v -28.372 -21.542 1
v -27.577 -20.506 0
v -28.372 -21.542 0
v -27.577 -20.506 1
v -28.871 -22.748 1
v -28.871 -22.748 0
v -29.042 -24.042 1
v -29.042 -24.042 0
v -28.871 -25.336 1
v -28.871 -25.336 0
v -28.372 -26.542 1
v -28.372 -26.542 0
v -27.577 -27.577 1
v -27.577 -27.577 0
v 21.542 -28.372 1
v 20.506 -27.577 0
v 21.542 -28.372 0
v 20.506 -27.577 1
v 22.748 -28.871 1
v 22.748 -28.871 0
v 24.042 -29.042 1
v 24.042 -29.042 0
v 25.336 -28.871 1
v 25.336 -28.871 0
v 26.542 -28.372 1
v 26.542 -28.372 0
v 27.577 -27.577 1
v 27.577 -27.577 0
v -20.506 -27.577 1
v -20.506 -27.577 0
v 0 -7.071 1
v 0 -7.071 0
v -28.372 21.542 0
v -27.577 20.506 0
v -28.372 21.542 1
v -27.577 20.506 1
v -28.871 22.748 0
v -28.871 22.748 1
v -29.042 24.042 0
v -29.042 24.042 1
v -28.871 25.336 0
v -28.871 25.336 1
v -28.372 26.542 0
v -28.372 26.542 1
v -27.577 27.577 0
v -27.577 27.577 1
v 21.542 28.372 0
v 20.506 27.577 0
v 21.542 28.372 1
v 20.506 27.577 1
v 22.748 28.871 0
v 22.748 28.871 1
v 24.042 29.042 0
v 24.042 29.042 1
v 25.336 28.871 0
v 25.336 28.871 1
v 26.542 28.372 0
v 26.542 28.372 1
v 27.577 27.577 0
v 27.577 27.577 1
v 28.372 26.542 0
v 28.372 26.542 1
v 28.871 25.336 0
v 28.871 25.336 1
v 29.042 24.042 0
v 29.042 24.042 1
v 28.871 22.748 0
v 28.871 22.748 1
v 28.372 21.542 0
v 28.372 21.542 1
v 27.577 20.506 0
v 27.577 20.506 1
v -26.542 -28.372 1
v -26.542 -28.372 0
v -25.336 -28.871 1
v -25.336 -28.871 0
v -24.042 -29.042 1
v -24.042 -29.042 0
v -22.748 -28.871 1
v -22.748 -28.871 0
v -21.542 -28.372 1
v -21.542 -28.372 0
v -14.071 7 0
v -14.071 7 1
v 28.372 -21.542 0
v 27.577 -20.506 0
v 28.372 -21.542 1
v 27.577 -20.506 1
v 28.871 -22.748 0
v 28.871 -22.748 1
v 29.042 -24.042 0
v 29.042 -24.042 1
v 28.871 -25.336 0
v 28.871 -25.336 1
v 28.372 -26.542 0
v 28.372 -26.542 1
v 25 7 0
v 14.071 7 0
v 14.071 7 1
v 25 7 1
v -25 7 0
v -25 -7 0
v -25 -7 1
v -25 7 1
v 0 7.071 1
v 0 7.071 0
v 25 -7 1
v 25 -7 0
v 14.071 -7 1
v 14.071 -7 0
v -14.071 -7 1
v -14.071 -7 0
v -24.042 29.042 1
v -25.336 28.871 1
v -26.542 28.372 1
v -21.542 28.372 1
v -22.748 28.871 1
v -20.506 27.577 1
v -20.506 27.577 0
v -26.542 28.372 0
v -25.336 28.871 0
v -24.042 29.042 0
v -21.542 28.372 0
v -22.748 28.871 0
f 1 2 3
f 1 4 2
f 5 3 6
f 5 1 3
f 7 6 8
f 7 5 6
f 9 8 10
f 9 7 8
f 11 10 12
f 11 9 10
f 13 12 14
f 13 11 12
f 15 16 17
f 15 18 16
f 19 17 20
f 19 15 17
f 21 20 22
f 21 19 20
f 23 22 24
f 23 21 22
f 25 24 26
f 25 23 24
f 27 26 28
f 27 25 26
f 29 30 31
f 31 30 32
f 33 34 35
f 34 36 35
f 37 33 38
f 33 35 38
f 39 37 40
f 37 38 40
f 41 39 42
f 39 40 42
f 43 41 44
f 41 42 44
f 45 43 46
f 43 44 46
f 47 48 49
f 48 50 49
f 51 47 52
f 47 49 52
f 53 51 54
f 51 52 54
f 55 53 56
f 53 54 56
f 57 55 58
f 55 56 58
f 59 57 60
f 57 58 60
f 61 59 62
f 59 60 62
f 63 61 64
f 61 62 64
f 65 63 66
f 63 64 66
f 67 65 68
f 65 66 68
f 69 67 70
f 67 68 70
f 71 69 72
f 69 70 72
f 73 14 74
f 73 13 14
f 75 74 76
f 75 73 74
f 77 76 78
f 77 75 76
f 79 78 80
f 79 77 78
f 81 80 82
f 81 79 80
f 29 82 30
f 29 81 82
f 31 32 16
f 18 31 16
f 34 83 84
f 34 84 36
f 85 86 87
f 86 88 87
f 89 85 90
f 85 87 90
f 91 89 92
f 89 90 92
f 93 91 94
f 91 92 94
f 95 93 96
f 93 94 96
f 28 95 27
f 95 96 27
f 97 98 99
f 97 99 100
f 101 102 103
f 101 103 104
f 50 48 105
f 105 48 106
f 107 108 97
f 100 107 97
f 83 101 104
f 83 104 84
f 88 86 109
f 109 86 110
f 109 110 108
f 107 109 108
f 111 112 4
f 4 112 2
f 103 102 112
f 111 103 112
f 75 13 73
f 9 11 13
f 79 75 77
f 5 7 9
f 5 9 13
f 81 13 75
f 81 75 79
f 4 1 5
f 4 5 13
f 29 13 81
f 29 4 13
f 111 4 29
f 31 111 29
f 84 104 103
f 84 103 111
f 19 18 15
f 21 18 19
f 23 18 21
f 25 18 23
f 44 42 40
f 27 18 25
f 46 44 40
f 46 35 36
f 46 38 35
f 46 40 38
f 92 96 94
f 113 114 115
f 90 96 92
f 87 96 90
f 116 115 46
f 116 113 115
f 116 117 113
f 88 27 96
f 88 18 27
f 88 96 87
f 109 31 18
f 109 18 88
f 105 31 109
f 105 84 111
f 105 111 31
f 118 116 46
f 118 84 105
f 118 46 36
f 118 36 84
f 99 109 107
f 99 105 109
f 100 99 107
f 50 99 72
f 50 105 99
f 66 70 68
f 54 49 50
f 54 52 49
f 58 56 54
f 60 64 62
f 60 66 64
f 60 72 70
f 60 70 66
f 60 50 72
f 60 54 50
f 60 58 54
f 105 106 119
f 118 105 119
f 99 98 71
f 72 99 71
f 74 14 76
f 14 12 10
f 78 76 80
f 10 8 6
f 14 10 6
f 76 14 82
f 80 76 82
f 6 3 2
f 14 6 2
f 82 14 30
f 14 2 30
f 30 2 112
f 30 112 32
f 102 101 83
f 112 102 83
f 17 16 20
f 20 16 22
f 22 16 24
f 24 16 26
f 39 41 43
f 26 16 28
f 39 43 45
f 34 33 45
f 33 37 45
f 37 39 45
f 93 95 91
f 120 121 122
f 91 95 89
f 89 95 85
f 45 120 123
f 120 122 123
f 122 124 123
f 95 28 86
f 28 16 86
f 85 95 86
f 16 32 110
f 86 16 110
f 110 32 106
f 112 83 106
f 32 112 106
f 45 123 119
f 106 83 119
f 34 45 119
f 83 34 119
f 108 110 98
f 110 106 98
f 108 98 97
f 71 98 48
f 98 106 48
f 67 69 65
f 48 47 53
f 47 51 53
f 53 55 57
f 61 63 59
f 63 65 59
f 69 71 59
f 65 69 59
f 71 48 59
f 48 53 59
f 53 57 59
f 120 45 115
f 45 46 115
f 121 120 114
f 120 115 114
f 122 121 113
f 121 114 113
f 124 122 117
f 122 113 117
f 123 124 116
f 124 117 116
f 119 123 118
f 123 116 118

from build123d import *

# Parameters (mm, degrees)
F1_W     = 10
F1_H     = 34
F1_H_2   = 10
F1_W_2   = 34
F2_DEPTH = 1
F3_ANGLE = 45
F4_W     = 50
F4_H     = 14
F5_DEPTH = 1
F6_R     = 4.99999


# Not quite as in the source:
# - a fillet or chamfer is up to 0.001 mm smaller than in the source, because OpenCascade refuses the exact size


with BuildPart() as f2:
    # F1 (on Top) → F2 (new body)
    with BuildSketch(Plane.XY):
        with Locations((0, -22)):
            Rectangle(F1_W, F1_H)
        Rectangle(F1_W, F1_H_2)
        with Locations((22, 0)):
            Rectangle(F1_W_2, F1_H_2)
        with Locations((-22, 0)):
            Rectangle(F1_W_2, F1_H_2)
        with Locations((0, 22)):
            Rectangle(F1_W, F1_H)
    extrude(amount=F2_DEPTH)


with BuildPart() as f2_1:
    # F3: moved
    add(f2.part.rotate(Axis((0, 0, 15.9228555858), (0, 0, 1)), F3_ANGLE))

    # F4 (on Top) → F5 (join)
    with BuildSketch(Plane.XY):
        Rectangle(F4_W, F4_H)
    extrude(amount=F5_DEPTH)

    # F6 (radius 5 in the source; OpenCascade refuses exactly that, so slightly less here)
    f6_edges = [f2_1.edges().sort_by_distance(p)[0] for p in [
        (-31.112698, 24.041631, 0.5),
        (-31.112698, -24.041631, 0.5),
        (-24.041631, -31.112698, 0.5),
        (24.041631, -31.112698, 0.5),
        (31.112698, 24.041631, 0.5),
        (31.112698, -24.041631, 0.5),
        (24.041631, 31.112698, 0.5),
        (-24.041631, 31.112698, 0.5),
    ]]
    fillet(f6_edges, radius=F6_R)


solid = f2_1.part
